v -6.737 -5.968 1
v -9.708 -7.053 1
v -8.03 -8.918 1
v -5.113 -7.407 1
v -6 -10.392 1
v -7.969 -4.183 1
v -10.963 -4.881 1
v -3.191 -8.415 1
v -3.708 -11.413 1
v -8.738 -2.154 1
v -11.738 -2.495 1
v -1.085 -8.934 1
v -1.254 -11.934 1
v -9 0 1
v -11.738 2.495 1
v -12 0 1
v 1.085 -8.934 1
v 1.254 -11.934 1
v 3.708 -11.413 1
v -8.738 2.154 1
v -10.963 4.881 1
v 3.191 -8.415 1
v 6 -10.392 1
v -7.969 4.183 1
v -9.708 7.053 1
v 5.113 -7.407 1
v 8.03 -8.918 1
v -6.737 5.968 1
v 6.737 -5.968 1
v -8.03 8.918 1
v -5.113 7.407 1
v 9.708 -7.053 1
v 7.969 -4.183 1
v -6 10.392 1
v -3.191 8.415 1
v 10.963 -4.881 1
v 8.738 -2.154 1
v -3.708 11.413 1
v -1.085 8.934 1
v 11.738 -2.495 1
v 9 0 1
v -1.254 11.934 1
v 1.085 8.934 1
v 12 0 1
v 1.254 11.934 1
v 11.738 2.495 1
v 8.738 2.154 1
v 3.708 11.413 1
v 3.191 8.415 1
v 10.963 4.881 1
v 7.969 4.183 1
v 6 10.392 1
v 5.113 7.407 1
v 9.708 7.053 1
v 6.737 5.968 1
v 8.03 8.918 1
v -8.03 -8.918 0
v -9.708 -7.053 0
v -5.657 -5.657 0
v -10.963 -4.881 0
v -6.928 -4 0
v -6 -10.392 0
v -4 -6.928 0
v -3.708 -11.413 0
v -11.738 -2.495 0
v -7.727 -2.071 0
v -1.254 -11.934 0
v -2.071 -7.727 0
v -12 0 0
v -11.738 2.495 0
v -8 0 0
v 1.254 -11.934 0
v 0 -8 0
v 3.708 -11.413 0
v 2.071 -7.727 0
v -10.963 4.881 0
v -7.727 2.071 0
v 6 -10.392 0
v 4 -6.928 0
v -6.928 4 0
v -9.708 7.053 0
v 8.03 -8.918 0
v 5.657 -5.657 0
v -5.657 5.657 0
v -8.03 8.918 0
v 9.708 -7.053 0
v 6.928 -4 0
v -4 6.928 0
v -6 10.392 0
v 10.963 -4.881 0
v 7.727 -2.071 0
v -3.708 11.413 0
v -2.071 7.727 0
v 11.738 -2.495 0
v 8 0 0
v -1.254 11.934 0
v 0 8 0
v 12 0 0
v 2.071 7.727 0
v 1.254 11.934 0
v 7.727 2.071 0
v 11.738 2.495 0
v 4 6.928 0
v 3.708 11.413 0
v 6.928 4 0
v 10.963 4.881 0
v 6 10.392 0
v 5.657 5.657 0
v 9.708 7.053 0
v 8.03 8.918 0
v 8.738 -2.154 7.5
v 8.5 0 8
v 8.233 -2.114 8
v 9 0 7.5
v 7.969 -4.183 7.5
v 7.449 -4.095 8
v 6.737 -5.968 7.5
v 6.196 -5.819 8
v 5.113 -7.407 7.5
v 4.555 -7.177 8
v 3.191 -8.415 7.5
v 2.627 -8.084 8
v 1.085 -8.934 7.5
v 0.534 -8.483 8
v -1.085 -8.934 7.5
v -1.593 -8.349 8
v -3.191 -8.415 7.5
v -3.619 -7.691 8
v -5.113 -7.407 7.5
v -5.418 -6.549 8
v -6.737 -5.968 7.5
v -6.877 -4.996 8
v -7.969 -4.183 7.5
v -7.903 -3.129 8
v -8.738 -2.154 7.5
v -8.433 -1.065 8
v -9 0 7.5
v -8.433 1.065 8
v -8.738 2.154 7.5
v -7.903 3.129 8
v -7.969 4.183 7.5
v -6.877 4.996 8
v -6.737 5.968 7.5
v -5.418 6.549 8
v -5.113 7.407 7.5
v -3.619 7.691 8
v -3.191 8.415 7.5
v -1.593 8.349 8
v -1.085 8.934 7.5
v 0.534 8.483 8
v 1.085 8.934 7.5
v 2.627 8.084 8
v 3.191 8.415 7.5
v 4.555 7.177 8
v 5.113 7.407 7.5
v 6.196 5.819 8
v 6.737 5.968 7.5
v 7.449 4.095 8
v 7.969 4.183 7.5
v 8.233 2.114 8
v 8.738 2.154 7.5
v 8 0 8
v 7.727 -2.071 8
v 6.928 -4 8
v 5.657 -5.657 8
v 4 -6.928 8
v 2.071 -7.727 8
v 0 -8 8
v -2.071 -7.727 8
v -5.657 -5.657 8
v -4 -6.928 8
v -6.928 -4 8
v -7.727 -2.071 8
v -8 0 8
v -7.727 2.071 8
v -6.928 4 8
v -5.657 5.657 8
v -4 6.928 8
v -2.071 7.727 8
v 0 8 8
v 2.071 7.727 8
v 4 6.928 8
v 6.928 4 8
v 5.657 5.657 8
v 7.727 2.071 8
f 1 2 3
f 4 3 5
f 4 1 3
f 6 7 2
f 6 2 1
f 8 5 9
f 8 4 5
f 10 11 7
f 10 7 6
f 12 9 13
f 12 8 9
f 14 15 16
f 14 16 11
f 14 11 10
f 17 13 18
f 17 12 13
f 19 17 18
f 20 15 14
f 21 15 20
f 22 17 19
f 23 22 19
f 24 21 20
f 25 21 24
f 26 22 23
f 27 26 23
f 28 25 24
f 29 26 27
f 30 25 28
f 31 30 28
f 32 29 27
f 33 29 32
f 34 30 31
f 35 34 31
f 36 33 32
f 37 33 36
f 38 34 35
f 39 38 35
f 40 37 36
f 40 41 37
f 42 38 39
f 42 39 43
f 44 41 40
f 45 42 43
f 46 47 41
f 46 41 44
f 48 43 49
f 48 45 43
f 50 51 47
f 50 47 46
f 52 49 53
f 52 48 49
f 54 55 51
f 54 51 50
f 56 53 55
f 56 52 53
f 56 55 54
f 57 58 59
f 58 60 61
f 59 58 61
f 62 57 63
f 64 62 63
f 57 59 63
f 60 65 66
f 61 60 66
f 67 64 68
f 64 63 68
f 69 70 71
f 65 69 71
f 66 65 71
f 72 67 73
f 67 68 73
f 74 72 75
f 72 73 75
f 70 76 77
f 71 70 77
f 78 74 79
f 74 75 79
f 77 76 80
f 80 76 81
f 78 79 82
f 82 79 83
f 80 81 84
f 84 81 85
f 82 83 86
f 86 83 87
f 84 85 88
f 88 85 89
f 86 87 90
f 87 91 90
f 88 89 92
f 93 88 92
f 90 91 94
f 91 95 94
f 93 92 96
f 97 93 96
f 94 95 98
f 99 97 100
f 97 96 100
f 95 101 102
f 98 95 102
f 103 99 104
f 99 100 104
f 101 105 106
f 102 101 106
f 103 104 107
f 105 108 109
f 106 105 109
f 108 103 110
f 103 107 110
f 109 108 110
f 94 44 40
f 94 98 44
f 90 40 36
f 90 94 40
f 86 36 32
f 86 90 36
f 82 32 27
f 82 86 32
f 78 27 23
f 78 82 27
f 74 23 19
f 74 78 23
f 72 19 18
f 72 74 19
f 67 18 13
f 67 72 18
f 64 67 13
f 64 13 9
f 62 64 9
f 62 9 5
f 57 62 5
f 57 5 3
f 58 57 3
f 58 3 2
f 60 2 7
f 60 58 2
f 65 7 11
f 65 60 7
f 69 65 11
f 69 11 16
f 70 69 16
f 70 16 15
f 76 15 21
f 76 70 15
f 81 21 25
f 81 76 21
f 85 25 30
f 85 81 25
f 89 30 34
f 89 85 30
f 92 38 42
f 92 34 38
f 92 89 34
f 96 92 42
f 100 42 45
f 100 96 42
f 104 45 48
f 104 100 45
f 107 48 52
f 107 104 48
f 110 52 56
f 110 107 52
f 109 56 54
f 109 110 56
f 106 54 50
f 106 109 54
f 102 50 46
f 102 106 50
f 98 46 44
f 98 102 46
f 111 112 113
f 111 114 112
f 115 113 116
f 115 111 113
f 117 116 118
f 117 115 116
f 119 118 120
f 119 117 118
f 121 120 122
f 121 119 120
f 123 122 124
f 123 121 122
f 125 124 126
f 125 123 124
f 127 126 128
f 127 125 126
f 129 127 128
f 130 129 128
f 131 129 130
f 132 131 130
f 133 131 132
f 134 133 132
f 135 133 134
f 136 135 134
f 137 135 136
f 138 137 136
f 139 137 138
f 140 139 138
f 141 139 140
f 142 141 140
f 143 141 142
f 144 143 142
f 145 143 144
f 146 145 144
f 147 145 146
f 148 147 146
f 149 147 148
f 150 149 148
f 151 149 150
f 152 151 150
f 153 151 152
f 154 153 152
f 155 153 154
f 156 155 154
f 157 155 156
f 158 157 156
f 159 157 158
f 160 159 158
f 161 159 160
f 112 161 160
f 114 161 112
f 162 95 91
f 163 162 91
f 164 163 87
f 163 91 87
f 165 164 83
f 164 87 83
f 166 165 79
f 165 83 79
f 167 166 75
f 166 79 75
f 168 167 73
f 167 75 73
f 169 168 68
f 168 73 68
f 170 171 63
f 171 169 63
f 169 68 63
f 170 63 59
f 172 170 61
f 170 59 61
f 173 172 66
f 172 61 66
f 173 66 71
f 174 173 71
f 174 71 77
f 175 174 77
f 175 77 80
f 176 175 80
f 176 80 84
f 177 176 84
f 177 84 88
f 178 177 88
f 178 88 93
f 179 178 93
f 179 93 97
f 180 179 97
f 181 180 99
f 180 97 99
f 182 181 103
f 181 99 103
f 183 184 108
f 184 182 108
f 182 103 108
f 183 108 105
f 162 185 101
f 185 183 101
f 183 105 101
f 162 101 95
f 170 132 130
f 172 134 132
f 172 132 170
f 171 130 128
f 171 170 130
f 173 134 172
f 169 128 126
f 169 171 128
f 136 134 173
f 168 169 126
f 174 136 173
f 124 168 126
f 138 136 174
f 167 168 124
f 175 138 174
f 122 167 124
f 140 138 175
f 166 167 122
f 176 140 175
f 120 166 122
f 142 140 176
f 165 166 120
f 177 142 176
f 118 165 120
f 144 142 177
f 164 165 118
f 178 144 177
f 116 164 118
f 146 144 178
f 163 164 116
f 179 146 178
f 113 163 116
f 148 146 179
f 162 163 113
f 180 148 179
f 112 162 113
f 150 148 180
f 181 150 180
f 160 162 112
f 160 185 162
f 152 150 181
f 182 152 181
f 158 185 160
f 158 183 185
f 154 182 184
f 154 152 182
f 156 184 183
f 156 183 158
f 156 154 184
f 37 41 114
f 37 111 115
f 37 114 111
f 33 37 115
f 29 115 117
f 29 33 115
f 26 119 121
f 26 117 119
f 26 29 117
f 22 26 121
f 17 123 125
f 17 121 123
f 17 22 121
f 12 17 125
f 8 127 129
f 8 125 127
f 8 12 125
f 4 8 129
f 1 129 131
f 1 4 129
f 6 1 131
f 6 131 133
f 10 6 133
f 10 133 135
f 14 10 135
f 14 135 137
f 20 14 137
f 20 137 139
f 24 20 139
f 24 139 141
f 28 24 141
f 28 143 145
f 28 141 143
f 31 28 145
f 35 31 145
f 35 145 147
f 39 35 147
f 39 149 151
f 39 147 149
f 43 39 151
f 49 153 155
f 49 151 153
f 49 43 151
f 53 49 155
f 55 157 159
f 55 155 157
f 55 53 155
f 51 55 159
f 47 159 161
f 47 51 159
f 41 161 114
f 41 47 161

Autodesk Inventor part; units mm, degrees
ref_plane "YZ Plane" through (0, 0, 0) normal (1, 0, 0) x (0, 1, 0)
ref_plane "XZ Plane" through (0, 0, 0) normal (0, 1, 0) x (-1, 0, 0)
ref_plane "XY Plane" through (0, 0, 0) normal (0, 0, 1) x (1, 0, 0)
sketch "スケッチ1" plane through (0, 0, 0) normal (0, 0, 1) x (1, 0, 0)
  circle A0 centre (0, 0) radius 8
  circle A1 centre (0, 0) radius 12
  dimension "d0" = 16
  dimension "d1" = 24
extrude "押し出し1" add sketch "スケッチ1" along normal blind 1
sketch "スケッチ2" plane through (0, 0, 1) normal (0, 0, 1) x (1, 0, 0)
  circle A0 centre (0, 0) radius 9
  circle A1 centre (0, 0) radius 12 projected
  circle A2 centre (0, 0) radius 8 projected
  dimension "d4" = 18
extrude "押し出し2" add sketch "スケッチ2" along normal blind 7 contours A0
chamfer "面取り1" distance 0.5 angle 45 1 edges at (-9, 0, 8)
properties part number "オイレスw10f16-18a" material "アセタール樹脂、黒"
